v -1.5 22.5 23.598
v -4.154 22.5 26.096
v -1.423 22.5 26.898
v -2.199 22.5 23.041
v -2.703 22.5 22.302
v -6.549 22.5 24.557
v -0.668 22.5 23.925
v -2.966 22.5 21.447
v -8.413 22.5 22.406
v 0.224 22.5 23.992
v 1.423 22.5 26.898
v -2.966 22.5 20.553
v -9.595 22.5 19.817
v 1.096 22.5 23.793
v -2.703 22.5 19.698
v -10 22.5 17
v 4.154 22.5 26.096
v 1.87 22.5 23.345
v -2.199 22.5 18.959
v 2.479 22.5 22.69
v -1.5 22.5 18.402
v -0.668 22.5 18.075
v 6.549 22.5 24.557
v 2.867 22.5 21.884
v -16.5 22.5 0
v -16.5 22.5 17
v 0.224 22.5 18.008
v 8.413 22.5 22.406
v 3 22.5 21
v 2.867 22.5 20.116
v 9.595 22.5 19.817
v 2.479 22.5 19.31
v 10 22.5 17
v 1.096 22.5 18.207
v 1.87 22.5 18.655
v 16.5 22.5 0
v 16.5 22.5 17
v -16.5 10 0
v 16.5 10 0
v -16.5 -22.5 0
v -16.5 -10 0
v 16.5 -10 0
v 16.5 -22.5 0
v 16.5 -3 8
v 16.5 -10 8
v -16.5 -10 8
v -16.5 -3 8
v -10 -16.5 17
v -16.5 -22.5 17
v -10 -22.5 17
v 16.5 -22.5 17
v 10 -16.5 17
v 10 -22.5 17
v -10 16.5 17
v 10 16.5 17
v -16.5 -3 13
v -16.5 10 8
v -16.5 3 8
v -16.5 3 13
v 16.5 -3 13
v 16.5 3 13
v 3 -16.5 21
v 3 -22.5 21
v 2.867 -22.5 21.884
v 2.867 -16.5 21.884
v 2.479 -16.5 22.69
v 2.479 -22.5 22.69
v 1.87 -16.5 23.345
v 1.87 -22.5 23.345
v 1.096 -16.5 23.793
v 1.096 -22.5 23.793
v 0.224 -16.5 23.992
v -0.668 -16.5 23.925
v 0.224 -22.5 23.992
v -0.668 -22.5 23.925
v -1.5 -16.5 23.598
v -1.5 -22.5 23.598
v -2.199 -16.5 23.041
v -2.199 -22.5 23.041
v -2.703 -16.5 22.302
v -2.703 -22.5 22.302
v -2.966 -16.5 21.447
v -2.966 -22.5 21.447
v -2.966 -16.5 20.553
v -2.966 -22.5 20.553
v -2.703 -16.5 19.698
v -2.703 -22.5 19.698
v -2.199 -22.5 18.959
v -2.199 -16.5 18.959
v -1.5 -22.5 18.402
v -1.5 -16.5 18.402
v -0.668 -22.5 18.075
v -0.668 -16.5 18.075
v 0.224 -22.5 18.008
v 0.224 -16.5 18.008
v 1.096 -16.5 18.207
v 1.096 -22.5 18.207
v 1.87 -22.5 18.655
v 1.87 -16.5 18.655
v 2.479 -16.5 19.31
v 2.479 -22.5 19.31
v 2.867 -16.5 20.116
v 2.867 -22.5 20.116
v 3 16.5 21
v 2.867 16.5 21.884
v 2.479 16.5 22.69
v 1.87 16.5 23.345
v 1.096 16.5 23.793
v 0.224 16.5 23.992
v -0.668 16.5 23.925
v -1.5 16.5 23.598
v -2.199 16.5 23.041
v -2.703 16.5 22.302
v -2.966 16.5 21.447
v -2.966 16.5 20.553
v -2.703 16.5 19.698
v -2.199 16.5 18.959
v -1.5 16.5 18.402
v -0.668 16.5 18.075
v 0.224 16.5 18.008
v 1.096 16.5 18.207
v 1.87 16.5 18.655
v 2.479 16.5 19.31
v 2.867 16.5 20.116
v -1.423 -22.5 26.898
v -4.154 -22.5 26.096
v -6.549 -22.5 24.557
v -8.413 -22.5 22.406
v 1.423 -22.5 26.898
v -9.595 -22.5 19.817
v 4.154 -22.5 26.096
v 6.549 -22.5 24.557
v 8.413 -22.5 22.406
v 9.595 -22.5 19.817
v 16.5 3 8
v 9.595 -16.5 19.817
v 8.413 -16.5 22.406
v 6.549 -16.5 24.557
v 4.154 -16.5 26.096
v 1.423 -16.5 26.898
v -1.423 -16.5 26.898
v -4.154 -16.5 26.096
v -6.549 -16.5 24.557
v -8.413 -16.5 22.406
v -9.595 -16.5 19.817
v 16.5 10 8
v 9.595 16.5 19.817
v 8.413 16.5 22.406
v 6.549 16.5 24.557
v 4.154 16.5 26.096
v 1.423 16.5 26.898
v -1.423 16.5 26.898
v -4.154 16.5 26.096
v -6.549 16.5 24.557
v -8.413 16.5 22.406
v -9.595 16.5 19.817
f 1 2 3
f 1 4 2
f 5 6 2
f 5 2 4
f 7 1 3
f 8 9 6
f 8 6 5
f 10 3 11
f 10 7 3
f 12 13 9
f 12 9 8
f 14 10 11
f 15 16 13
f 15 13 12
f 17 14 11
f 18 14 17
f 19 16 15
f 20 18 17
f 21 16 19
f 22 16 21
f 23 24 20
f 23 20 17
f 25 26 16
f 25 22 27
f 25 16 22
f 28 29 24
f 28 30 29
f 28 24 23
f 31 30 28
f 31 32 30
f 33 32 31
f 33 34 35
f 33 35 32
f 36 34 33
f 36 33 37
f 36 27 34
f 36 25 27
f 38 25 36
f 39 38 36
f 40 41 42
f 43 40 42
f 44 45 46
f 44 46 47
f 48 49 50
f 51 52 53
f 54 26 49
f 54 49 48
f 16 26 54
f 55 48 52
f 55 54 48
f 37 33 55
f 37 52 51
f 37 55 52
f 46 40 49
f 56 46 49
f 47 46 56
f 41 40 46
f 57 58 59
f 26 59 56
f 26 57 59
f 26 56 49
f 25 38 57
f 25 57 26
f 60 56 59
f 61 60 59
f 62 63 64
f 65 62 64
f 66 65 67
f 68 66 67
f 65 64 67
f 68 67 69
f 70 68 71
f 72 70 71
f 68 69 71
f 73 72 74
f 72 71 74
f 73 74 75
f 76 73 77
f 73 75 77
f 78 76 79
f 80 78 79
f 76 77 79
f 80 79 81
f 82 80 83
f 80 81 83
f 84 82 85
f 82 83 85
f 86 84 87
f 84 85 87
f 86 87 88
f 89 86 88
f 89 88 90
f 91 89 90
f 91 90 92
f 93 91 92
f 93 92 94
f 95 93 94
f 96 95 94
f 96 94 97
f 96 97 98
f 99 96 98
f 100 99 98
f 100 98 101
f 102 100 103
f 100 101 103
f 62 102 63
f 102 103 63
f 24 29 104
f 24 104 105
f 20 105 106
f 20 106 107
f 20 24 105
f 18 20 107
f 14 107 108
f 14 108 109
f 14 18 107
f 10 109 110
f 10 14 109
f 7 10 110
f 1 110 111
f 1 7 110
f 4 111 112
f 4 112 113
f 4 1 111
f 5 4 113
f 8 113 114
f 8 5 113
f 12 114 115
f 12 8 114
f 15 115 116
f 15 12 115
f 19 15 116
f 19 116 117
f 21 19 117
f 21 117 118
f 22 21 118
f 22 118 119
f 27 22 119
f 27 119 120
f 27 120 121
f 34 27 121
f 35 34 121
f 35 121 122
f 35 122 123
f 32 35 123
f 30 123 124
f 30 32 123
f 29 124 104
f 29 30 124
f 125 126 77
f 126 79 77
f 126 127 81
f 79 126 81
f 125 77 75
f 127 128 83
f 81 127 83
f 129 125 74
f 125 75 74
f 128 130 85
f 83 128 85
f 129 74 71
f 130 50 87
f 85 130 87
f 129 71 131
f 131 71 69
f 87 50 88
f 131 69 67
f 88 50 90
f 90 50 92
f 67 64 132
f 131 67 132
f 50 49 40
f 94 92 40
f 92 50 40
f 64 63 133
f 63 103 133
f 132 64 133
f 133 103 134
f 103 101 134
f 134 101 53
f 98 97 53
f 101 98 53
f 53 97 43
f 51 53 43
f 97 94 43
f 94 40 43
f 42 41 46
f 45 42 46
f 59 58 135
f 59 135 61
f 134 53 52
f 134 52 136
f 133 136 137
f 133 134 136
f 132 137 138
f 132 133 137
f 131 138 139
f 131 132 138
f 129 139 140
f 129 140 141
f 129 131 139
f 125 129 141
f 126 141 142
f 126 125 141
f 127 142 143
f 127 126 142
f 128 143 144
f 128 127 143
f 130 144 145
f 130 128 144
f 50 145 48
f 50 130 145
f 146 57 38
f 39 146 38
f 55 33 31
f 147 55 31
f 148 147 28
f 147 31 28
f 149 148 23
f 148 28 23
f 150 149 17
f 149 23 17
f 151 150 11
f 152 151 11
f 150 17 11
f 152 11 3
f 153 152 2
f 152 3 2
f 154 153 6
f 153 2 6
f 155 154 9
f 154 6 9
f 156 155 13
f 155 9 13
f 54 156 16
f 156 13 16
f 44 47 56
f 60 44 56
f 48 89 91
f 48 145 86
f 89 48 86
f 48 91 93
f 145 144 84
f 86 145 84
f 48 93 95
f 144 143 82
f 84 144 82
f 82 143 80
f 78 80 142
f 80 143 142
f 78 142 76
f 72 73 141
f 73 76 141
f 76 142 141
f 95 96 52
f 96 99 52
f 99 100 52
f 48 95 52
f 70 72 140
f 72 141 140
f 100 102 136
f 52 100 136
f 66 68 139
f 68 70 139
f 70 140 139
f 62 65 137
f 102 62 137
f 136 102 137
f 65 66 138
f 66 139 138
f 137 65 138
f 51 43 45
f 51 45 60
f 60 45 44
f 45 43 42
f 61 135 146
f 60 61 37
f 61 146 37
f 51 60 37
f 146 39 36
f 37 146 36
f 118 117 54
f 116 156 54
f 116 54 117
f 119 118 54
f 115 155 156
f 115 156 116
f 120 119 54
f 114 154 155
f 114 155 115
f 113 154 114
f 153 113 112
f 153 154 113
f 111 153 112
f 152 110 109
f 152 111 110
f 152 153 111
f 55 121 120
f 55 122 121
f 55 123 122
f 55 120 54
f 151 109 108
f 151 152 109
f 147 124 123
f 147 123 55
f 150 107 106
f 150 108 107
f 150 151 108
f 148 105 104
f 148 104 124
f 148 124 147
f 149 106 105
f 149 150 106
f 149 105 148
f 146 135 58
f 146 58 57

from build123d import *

# Parameters (mm, degrees)
SKETCH_1_W          = 33
SKETCH_1_H          = 45
EXTRUDE_1_DEPTH     = 17
SKETCH_2_W          = 5
SKETCH_2_H          = 6
CUT_EXTRUDE_1_DEPTH = 44.407948581
SKETCH_4_R          = 3
EXTRUDE_2_DEPTH     = 6


with BuildPart() as part:
    # Эскиз1 → Бобышка-Вытянуть1 (new body)
    with BuildSketch(Plane.XY):
        Rectangle(SKETCH_1_W, SKETCH_1_H)
    extrude(amount=EXTRUDE_1_DEPTH)

    # Эскиз2 → Вырез-Вытянуть1 (cut, through all)
    with BuildSketch(Plane.ZY.offset(16.5)):
        Polygon((8, 3), (8, 10), (0, 10), (0, -10), (8, -10), (8, -3), align=None)
        with Locations((10.5, 0)):
            Rectangle(SKETCH_2_W, SKETCH_2_H)
    extrude(amount=-CUT_EXTRUDE_1_DEPTH, mode=Mode.SUBTRACT)

    # Эскиз4 → Бобышка-Вытянуть2 (add)
    with BuildSketch(Plane.XZ.offset(22.5)):
        with BuildLine():
            Line((-10, 17), (10, 17))
            ThreePointArc((10, 17), (0, 27), (-10, 17))
        make_face()
        with Locations((0, 21)):
            Circle(SKETCH_4_R, mode=Mode.SUBTRACT)
    extrude_2 = extrude(amount=-EXTRUDE_2_DEPTH)

    # Зеркальное отражение1: Бобышка-Вытянуть2 across plane
    add(extrude_2.mirror(Plane.ZX))


solid = part.part
